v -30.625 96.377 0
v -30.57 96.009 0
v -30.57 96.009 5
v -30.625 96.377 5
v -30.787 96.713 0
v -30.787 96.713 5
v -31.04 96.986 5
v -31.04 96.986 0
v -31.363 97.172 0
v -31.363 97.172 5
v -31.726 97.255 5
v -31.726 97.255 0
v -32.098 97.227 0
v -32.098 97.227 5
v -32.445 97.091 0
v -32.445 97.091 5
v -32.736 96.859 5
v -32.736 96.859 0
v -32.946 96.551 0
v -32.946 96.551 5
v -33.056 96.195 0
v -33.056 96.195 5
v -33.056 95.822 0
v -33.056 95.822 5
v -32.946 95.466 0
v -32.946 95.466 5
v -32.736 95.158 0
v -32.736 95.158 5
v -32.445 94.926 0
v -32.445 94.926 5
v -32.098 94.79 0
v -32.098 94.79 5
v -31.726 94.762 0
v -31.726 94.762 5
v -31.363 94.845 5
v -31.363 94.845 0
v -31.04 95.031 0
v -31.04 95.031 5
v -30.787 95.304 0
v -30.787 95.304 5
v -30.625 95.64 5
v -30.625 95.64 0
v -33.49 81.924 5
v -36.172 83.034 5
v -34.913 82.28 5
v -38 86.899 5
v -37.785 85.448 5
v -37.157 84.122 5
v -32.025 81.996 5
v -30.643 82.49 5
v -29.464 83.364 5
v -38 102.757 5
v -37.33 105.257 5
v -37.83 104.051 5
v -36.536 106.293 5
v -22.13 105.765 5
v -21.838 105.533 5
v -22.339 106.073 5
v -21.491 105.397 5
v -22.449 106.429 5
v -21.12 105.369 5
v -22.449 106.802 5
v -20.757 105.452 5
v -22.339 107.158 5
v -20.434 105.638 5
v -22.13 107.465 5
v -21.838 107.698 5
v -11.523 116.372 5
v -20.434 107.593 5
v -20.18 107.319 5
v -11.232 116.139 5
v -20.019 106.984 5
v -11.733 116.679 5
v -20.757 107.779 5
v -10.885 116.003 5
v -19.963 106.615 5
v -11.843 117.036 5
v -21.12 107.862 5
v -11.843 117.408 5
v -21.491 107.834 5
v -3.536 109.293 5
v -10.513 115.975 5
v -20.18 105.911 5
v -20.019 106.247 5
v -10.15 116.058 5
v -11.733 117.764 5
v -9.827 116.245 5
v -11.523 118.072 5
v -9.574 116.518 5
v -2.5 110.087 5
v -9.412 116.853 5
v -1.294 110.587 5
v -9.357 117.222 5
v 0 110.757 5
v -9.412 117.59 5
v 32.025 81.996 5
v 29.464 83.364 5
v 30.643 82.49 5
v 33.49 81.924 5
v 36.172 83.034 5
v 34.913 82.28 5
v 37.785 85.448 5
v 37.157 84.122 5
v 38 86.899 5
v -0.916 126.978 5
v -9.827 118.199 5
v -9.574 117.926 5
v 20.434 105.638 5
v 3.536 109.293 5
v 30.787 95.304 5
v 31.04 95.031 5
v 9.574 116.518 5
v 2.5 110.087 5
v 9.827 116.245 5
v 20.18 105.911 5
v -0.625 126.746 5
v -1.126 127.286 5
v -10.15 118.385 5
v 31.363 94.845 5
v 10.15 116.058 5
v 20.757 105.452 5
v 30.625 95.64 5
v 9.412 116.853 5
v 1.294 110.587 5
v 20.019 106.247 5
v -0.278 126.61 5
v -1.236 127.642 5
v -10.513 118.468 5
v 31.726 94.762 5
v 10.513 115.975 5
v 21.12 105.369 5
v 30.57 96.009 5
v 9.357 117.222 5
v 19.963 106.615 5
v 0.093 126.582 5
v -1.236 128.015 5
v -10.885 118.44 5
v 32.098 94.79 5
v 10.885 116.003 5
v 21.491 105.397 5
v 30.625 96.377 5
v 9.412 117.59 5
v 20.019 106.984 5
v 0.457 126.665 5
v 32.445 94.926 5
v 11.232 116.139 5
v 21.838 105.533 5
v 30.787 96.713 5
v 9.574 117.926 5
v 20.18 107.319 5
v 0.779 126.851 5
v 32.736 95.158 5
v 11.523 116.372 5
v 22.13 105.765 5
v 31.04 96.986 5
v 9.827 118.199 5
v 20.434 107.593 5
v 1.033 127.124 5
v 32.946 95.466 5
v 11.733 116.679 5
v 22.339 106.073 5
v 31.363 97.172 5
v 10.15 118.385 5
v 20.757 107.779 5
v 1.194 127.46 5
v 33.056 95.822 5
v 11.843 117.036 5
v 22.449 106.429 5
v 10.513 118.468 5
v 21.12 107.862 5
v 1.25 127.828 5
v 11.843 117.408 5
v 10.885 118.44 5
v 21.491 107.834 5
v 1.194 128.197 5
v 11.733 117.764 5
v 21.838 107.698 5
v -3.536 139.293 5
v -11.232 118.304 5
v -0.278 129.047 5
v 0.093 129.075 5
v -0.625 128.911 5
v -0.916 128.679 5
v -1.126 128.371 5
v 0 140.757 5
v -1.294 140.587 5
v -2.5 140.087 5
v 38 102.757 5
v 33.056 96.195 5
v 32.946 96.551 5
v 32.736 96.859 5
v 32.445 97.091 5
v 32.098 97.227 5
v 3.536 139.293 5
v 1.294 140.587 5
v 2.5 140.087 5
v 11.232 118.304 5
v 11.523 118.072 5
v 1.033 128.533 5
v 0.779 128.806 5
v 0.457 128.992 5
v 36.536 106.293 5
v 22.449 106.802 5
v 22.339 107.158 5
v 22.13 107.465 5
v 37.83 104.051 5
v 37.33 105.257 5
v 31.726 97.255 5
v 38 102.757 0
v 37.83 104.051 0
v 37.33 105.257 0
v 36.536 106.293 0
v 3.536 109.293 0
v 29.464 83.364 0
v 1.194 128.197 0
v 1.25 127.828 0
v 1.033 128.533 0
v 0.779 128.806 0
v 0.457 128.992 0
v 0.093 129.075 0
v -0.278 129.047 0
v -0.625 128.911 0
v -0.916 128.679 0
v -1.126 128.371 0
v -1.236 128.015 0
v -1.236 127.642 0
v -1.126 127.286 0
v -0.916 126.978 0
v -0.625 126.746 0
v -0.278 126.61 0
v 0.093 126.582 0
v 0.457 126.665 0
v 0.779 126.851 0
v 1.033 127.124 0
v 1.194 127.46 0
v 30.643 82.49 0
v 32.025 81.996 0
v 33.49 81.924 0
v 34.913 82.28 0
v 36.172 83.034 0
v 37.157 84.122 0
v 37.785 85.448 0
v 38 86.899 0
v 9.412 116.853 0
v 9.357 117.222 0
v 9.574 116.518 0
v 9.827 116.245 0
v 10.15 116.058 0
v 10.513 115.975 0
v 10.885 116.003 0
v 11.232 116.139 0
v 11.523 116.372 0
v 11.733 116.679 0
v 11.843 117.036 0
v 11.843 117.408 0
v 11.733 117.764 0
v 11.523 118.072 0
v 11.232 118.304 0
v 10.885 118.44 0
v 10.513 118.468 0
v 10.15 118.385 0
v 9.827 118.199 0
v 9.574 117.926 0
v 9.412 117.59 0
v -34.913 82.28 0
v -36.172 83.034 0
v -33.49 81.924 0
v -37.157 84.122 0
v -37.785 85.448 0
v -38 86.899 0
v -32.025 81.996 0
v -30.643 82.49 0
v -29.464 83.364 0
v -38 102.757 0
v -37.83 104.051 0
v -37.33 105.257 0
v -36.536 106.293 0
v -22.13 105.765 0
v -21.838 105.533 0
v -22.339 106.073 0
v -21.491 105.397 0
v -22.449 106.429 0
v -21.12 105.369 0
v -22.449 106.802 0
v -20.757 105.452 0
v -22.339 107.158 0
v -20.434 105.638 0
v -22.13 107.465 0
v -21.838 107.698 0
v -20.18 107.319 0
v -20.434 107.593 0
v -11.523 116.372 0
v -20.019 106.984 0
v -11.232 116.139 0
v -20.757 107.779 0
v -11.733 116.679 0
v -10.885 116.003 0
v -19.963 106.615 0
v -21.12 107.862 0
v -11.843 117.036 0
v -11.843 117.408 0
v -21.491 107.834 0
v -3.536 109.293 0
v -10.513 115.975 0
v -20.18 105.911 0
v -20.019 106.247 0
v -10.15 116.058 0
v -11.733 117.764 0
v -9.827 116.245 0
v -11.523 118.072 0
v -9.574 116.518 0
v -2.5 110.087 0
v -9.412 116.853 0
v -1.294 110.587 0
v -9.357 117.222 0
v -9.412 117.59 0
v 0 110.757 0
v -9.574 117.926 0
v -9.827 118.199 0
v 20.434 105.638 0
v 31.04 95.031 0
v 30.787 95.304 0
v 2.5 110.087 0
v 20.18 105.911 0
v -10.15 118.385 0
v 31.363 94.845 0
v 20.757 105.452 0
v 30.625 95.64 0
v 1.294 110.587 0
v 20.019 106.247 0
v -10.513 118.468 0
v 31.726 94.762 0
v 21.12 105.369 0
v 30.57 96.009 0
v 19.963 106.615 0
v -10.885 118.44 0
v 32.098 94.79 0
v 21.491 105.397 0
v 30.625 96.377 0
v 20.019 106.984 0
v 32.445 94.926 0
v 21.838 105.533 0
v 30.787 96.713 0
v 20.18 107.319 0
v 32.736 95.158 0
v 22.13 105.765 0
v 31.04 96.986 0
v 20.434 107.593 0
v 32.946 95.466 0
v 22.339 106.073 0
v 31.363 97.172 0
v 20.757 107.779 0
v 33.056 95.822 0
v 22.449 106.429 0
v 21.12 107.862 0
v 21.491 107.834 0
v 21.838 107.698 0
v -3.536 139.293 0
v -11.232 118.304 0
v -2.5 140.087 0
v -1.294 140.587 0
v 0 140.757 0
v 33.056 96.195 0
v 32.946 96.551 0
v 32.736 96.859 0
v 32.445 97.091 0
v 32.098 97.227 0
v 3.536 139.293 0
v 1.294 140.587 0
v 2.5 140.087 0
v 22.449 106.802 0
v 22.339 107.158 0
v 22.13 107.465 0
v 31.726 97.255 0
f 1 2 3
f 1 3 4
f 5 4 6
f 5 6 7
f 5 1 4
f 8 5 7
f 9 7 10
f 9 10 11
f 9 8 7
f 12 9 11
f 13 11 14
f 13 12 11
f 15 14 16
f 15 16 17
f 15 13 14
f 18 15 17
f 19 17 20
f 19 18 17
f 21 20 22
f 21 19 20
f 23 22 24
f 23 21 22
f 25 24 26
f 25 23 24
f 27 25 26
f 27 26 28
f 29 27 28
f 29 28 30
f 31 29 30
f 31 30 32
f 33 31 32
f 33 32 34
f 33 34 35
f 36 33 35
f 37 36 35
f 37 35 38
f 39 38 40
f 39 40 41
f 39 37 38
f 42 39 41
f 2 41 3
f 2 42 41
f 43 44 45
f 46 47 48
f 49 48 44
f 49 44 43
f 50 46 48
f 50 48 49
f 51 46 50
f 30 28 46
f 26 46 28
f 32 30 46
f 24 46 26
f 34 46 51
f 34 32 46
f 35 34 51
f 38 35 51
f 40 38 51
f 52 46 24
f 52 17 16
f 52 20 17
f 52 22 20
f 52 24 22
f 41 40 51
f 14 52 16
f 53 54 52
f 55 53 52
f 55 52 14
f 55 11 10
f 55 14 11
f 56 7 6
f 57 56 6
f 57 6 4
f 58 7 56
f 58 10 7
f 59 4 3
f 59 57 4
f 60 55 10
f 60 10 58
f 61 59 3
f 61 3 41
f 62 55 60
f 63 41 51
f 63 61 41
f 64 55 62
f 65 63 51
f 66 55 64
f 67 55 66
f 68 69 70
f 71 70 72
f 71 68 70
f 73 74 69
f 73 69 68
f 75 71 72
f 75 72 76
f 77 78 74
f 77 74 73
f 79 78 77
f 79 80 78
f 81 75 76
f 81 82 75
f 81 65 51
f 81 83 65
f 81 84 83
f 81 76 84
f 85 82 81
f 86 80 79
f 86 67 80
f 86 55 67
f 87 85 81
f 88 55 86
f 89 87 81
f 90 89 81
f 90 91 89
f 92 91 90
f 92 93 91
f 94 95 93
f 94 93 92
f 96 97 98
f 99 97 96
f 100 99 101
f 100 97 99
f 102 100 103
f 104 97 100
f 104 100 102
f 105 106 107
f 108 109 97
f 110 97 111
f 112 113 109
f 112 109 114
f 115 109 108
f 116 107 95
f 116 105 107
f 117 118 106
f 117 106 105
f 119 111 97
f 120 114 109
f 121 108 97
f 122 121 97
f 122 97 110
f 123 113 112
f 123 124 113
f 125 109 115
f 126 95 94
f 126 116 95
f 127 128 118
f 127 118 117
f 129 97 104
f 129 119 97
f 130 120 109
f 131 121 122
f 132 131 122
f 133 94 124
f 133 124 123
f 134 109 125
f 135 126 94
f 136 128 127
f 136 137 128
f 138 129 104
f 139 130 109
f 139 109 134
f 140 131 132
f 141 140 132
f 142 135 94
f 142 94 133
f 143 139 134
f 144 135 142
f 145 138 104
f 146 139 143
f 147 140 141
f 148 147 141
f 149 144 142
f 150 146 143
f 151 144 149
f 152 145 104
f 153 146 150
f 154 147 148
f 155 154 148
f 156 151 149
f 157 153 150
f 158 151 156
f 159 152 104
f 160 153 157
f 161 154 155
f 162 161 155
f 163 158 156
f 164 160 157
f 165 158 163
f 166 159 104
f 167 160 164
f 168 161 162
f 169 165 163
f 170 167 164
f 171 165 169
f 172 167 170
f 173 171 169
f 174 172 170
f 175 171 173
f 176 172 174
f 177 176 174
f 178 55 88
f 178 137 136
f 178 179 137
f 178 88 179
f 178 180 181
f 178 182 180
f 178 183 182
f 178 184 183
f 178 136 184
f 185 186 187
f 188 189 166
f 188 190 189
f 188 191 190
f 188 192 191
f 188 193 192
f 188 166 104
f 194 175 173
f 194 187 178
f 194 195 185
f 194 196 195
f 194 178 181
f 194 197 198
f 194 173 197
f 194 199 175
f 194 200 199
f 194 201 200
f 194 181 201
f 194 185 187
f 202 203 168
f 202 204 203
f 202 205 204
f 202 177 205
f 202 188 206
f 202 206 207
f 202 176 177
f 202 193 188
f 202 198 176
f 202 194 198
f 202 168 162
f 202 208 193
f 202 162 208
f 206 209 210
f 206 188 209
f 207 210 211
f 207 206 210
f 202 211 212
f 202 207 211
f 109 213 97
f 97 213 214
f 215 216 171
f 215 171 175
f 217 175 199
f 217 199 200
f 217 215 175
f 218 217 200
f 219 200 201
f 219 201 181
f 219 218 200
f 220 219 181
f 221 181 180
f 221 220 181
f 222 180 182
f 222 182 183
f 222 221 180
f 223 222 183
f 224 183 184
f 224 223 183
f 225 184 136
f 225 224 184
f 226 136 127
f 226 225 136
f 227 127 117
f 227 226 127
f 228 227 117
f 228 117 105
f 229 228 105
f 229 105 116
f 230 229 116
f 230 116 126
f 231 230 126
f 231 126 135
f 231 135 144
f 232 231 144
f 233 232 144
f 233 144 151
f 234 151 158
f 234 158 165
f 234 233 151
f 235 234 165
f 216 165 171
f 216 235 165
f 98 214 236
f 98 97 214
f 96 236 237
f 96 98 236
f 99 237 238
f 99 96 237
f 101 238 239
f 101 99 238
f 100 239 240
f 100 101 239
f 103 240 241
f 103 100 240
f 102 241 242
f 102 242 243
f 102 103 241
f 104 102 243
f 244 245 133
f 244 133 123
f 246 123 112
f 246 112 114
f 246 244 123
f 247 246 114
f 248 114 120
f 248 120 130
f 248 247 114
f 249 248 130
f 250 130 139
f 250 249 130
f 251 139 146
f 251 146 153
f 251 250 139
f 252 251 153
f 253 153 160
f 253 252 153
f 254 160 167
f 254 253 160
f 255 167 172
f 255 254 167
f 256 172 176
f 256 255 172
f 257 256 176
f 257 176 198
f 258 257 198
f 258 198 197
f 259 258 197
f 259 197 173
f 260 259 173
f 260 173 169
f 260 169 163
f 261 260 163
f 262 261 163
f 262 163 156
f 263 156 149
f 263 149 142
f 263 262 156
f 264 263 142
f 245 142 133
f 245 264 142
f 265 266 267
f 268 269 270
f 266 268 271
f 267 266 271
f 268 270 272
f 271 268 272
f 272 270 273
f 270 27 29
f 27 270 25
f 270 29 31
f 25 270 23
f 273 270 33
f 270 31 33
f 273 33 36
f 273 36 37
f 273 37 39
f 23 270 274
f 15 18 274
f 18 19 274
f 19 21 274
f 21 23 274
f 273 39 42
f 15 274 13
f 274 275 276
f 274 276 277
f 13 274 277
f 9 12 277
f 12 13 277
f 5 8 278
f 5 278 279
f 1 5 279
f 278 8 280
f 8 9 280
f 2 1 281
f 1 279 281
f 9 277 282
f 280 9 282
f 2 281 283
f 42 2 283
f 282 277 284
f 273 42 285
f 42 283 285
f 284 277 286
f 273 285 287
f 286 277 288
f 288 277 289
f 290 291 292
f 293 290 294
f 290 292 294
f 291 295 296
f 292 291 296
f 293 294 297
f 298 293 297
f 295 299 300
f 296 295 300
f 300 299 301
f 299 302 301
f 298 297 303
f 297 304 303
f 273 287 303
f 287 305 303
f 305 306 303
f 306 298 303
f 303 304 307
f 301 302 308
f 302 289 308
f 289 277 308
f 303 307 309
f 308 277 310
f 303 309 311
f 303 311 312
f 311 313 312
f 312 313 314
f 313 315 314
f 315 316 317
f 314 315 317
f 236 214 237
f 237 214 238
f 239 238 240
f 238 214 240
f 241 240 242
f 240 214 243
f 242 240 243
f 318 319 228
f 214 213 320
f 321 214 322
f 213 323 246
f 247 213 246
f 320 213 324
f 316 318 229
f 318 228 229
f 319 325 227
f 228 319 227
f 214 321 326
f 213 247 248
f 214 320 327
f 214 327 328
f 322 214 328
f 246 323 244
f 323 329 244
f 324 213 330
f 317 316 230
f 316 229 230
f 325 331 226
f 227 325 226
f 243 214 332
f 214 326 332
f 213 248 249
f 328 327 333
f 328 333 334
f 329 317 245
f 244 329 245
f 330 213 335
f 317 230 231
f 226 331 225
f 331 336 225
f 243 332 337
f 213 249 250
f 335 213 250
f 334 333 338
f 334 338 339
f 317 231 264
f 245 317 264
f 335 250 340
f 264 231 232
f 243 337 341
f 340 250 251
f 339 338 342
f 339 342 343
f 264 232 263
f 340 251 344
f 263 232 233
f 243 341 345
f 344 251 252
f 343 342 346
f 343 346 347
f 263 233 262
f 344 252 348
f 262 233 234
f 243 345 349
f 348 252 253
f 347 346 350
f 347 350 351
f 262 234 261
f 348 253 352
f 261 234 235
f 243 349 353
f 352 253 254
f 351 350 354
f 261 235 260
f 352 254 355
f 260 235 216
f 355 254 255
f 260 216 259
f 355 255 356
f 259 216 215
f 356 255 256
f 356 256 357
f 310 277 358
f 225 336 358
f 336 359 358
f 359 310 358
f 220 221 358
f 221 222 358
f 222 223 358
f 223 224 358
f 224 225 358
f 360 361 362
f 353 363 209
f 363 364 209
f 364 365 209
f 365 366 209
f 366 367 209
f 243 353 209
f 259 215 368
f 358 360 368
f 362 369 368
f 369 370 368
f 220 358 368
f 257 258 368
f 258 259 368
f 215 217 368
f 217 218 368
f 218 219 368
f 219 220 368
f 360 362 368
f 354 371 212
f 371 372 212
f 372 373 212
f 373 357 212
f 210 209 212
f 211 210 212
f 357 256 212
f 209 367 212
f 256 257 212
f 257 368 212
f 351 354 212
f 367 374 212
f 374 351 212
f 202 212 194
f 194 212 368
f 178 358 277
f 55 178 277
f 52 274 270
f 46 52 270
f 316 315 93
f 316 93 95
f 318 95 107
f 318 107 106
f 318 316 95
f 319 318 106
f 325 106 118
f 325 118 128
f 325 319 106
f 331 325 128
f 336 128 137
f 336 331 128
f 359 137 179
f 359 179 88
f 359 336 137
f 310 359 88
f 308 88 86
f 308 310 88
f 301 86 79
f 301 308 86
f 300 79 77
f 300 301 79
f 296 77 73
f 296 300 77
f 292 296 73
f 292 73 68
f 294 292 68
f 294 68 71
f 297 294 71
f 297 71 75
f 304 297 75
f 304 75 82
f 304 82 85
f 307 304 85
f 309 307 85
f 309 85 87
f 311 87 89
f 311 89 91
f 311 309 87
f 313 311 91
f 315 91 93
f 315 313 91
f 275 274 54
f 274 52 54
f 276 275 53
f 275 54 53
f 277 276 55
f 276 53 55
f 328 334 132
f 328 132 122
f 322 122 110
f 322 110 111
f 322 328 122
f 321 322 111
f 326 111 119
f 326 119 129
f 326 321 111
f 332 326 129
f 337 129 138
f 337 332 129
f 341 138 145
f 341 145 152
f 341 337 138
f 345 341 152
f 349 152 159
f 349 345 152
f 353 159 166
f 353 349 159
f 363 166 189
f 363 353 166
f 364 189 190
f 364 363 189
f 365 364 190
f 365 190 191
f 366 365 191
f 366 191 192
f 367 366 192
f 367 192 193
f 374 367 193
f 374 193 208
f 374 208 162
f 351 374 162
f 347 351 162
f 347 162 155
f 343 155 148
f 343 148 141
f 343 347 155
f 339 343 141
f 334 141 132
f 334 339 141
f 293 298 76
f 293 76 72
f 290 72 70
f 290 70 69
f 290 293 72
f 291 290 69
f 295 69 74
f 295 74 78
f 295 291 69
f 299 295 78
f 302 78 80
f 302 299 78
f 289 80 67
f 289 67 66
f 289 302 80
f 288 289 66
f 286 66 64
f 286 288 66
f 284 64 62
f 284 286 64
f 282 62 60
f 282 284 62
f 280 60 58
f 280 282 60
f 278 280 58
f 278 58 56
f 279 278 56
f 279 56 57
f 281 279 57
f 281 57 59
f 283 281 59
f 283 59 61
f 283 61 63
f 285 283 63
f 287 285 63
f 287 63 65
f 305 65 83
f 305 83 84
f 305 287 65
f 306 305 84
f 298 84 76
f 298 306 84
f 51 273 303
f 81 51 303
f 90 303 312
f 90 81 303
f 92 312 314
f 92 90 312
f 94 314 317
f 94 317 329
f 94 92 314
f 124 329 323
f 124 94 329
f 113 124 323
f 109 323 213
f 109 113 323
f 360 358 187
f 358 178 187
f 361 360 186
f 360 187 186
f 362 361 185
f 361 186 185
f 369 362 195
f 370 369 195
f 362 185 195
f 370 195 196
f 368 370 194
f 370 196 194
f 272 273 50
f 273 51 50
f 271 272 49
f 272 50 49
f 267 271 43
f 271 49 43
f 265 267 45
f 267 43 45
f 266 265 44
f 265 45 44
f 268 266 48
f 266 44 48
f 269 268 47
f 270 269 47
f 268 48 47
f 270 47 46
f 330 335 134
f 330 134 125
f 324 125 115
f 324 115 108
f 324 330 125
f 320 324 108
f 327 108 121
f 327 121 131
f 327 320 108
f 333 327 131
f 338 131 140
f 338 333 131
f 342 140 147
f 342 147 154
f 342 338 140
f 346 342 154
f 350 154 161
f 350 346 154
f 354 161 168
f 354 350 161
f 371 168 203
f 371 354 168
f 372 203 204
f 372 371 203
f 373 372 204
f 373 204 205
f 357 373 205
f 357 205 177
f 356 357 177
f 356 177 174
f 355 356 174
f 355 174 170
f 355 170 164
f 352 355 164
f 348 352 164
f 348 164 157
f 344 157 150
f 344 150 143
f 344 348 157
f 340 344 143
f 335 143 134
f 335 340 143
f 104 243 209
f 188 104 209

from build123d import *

# Parameters (mm, degrees)
SKETCH1_R           = 1.25
BOSS_EXTRUDE1_DEPTH = 5
FILLET1_R           = 5


with BuildPart() as part:
    # Sketch1 → Boss-Extrude1 (new body)
    with BuildSketch(Plane.XY):
        Polygon((-38, 74.828427125), (0, 112.828427125), (38, 74.828427125), (38, 104.828427125), (0, 142.828427125), (-38, 104.828427125), align=None)
        with Locations((-31.819805153, 96.008621971)):
            Circle(SKETCH1_R, mode=Mode.SUBTRACT)
        with Locations((-21.213203436, 106.615223689)):
            Circle(SKETCH1_R, mode=Mode.SUBTRACT)
        with Locations((-10.606601718, 117.221825407)):
            Circle(SKETCH1_R, mode=Mode.SUBTRACT)
        with Locations((0, 127.828427125)):
            Circle(SKETCH1_R, mode=Mode.SUBTRACT)
        with Locations(Location((10.606601718, 117.221825407, 0), (0, 0, 180))):
            Circle(SKETCH1_R, mode=Mode.SUBTRACT)
        with Locations(Location((21.213203436, 106.615223689, 0), (0, 0, 180))):
            Circle(SKETCH1_R, mode=Mode.SUBTRACT)
        with Locations(Location((31.819805153, 96.008621971, 0), (0, 0, 180))):
            Circle(SKETCH1_R, mode=Mode.SUBTRACT)
    extrude(amount=BOSS_EXTRUDE1_DEPTH)

    # Fillet1
    fillet1_edges = [part.edges().sort_by_distance(p)[0] for p in [
        (-38, 104.828427125, 2.5),
        (0, 142.828427125, 2.5),
        (38, 104.828427125, 2.5),
        (38, 74.828427125, 2.5),
        (0, 112.828427125, 2.5),
        (-38, 74.828427125, 2.5),
    ]]
    fillet(fillet1_edges, radius=FILLET1_R)


solid = part.part
